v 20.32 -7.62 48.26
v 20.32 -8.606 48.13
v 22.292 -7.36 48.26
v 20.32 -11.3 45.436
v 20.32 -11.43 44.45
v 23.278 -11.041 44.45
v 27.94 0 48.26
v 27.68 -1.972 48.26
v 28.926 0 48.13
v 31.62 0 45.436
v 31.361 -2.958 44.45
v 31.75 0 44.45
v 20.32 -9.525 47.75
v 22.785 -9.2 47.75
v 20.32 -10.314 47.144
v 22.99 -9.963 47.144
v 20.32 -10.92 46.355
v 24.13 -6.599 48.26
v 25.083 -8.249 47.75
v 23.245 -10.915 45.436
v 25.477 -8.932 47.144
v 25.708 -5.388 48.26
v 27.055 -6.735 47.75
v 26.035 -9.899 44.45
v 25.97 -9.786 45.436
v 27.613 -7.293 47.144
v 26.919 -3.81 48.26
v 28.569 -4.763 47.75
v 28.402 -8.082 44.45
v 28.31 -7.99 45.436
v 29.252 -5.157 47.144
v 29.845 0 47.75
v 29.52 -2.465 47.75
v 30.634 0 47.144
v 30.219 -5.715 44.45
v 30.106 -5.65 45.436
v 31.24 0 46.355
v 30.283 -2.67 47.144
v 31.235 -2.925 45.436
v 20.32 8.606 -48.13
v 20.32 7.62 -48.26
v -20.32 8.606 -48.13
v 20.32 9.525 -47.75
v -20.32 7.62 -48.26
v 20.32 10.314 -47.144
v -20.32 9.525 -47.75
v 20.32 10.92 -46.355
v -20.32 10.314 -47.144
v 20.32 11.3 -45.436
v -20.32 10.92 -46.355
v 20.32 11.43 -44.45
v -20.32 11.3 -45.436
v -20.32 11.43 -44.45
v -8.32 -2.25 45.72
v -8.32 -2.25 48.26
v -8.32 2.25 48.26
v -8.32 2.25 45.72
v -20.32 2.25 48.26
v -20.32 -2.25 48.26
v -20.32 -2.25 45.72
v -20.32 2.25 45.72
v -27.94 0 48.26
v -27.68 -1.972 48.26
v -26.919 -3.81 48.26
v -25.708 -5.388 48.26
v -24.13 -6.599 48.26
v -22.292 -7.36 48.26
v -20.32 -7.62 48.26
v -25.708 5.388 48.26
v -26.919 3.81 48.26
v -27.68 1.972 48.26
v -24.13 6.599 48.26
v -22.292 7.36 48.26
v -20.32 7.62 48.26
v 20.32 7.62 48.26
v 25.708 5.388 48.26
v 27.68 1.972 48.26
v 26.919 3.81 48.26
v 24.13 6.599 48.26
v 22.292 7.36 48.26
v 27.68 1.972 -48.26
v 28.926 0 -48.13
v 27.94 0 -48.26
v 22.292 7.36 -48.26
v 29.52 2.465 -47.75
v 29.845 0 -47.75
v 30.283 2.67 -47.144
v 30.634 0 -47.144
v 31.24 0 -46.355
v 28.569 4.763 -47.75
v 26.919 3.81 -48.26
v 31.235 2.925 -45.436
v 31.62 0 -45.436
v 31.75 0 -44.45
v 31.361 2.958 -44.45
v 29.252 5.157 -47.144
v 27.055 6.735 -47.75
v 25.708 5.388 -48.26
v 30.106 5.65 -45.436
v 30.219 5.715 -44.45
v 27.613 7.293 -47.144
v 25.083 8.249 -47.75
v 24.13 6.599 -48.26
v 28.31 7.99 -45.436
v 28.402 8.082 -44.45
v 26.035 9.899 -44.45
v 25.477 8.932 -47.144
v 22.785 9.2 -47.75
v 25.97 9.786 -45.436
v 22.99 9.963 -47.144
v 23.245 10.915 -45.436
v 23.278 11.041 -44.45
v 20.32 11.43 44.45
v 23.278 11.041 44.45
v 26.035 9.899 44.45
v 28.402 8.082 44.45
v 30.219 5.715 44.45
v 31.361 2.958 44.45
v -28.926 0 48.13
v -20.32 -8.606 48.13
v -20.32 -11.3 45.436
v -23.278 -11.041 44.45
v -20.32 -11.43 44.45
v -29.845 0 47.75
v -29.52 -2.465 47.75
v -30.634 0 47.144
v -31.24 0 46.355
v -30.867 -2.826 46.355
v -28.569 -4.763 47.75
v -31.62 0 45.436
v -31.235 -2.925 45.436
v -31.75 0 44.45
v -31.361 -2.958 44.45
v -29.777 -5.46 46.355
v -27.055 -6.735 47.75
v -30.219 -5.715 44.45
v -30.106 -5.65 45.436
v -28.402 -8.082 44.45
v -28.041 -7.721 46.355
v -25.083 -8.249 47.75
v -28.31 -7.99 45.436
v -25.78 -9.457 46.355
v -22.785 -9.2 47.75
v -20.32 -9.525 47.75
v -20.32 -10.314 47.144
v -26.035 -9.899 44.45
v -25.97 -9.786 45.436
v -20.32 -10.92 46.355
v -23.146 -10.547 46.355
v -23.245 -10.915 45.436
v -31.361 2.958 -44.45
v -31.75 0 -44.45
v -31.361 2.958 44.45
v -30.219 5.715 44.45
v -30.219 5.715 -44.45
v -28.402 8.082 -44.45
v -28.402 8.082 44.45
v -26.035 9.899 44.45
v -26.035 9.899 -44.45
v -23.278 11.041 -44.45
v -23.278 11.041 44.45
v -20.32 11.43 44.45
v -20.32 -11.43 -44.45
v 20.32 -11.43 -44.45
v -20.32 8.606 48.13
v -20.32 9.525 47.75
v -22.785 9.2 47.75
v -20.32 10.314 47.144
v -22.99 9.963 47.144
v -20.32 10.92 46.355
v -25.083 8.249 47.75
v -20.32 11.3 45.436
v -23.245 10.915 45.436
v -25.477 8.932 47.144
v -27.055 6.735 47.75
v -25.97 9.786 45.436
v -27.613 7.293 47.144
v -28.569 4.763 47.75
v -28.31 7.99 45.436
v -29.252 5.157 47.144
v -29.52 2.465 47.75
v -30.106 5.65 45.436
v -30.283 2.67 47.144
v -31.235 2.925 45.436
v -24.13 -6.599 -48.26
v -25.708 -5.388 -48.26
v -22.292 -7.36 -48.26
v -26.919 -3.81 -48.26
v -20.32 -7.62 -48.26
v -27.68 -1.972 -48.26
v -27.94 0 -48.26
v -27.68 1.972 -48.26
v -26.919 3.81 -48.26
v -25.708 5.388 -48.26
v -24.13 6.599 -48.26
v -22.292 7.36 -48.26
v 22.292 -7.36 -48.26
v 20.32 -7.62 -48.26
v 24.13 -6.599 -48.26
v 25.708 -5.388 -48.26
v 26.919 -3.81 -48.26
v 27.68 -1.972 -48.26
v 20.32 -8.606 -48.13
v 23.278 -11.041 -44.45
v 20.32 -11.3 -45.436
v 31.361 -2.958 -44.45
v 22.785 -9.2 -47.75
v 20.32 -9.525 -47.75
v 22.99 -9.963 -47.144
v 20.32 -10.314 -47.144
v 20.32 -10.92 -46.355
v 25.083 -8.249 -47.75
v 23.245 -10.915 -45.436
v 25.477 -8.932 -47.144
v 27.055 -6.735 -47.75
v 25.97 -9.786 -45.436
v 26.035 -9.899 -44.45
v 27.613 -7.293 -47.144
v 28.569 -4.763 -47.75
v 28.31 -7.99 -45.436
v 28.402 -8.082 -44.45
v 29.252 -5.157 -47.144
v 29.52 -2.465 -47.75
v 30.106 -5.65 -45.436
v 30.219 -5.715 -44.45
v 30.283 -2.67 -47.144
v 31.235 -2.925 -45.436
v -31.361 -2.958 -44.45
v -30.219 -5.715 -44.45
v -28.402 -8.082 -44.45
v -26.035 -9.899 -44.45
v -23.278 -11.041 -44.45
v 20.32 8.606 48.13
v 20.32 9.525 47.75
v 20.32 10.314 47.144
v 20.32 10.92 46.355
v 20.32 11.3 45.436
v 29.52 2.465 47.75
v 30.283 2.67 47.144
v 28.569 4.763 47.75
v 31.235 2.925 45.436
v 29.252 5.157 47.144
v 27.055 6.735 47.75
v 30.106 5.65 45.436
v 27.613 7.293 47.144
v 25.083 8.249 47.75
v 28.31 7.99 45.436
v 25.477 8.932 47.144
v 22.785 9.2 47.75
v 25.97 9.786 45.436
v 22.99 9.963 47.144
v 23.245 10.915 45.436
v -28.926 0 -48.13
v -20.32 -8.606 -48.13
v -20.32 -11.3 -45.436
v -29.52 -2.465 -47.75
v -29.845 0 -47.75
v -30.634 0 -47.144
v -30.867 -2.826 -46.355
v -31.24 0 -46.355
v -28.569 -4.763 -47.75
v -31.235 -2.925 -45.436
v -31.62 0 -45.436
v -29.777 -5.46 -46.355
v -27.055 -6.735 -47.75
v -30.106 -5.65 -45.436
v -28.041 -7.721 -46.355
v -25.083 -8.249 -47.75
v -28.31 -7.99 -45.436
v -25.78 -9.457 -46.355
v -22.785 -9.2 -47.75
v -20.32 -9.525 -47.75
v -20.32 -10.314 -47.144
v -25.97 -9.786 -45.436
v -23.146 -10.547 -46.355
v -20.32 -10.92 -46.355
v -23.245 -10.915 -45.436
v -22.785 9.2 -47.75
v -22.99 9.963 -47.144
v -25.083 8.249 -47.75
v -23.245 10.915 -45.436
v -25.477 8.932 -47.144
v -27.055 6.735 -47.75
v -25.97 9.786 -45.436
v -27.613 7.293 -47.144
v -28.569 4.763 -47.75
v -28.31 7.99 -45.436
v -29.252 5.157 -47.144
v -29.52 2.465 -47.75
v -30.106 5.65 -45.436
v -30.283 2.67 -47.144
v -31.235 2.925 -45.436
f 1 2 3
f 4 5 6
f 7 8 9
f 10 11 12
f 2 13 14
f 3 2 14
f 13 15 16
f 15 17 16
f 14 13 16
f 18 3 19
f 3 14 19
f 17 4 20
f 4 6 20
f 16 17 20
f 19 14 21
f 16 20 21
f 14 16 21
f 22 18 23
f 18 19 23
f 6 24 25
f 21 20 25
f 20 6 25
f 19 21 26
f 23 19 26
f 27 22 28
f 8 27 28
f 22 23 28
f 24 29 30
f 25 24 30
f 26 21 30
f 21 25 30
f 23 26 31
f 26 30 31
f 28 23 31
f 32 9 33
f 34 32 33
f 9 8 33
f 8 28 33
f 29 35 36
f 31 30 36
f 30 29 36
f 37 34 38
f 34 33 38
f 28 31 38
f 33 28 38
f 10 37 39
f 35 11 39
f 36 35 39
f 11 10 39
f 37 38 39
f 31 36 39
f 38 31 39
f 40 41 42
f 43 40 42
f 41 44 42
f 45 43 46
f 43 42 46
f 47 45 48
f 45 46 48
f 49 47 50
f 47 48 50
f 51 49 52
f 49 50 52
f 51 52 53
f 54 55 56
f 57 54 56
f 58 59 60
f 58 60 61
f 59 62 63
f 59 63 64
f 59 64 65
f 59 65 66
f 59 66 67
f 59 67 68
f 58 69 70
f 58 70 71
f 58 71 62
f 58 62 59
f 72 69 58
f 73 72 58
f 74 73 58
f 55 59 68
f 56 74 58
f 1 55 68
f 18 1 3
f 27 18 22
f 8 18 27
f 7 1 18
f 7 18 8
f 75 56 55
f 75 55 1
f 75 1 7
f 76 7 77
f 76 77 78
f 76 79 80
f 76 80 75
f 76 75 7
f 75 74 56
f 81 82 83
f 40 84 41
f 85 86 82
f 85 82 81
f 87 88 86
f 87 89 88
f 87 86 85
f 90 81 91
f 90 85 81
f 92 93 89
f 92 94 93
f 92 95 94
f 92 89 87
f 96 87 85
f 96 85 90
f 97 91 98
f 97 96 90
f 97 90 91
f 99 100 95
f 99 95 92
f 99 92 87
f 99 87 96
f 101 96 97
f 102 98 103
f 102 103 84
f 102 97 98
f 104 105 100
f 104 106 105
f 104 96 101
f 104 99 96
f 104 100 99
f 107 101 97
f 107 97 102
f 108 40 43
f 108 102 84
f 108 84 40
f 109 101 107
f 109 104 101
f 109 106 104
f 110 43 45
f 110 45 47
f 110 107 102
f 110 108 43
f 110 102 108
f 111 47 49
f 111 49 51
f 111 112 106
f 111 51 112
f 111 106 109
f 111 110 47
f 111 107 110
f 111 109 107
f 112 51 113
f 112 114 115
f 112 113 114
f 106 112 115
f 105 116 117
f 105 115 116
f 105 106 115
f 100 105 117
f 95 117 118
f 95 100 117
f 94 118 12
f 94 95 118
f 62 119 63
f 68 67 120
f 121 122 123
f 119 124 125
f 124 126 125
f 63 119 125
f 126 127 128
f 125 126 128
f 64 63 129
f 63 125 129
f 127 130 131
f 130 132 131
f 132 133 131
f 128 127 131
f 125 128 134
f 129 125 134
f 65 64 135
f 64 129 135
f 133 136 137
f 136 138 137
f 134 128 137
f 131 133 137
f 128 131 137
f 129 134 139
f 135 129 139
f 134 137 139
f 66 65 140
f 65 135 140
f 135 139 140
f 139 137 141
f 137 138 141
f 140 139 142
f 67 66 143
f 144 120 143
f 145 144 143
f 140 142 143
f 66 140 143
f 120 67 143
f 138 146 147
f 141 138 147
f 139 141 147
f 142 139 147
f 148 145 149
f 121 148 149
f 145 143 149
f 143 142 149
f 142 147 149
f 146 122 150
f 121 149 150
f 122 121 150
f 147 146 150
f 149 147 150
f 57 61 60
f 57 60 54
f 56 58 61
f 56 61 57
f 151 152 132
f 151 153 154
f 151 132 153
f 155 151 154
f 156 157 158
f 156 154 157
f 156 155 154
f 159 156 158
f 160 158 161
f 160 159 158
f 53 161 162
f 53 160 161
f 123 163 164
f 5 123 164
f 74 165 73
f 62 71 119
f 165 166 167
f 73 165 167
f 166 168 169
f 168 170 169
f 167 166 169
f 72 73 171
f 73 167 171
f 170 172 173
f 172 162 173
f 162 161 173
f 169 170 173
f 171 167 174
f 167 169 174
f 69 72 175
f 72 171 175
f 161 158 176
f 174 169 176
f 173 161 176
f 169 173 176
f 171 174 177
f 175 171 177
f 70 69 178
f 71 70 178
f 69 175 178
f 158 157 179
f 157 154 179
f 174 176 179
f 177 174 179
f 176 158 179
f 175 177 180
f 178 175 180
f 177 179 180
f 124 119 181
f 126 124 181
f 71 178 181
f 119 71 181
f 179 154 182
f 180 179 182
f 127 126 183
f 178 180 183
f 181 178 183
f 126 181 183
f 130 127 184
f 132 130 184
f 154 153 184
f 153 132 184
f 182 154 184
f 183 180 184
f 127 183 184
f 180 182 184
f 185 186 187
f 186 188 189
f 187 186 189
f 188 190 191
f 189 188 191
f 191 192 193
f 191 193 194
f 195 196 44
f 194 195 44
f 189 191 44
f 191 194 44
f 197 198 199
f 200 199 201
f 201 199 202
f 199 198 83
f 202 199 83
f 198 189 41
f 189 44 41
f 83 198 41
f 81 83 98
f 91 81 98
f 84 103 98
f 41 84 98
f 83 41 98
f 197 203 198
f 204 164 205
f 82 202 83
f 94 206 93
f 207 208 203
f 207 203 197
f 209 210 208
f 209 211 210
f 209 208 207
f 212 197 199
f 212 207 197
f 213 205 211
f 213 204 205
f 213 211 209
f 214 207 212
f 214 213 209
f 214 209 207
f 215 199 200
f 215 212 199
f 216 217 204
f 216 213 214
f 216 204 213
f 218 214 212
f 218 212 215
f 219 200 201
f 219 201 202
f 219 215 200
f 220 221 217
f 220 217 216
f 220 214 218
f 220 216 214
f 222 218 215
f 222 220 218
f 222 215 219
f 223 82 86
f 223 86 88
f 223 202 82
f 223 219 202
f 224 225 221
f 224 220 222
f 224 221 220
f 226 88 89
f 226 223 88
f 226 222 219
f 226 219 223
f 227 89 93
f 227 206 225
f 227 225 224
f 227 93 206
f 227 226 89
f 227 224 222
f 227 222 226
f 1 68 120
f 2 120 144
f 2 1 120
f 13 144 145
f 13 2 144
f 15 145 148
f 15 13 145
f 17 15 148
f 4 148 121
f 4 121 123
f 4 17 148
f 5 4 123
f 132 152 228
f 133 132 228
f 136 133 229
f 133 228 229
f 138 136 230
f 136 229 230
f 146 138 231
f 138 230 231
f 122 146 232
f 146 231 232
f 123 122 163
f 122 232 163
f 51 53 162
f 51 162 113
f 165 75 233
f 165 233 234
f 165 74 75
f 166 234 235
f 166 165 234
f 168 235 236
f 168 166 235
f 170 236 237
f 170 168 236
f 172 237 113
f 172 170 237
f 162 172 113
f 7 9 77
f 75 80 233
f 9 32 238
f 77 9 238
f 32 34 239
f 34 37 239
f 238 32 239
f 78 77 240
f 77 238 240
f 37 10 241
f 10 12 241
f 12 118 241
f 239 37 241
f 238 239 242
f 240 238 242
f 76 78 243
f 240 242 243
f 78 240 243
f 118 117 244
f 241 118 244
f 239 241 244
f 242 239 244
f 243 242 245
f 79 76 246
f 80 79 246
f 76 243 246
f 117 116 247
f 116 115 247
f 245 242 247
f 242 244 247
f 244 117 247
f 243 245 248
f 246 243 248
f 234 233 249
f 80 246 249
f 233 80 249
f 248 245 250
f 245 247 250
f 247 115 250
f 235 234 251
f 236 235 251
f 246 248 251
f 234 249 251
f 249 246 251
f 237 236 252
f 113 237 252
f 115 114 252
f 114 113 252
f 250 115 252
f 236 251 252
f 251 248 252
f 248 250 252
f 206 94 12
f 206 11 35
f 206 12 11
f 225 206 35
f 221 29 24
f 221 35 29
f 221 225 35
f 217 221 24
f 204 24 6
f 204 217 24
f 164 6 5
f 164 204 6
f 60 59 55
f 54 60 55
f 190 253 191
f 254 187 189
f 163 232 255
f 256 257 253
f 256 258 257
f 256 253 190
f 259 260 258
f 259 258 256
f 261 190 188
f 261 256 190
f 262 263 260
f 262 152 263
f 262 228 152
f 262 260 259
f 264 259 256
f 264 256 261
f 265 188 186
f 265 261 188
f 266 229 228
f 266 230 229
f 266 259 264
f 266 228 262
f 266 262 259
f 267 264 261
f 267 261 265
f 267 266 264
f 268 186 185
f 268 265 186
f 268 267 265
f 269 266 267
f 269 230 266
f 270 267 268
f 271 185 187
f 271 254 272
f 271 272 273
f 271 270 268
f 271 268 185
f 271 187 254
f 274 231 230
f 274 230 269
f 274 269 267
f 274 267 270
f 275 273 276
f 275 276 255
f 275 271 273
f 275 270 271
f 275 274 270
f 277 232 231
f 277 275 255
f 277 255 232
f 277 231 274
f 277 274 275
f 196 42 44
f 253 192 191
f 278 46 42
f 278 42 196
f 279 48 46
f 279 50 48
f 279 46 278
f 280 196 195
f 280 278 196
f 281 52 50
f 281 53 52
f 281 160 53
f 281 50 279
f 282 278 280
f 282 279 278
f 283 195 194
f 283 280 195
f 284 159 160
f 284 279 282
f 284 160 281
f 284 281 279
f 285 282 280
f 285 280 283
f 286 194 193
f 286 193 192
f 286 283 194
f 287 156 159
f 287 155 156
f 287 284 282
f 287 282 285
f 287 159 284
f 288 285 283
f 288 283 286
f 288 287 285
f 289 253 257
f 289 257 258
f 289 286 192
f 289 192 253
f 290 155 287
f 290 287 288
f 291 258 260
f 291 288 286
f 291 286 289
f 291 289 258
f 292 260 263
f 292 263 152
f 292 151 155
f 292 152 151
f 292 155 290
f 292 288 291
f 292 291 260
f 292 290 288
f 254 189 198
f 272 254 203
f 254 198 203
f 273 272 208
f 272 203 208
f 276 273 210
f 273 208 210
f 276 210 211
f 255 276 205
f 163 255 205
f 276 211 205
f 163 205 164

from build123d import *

# Parameters (mm, degrees)
SKETCH1_W           = 63.5
SKETCH1_H           = 96.52
BOSS_EXTRUDE1_DEPTH = 11.43
FILLET1_R           = 11.43
FILLET2_R           = 3.81
SKETCH2_W           = 12
SKETCH2_H           = 4.49999989
CUT_EXTRUDE1_DEPTH  = 2.54


with BuildPart() as part:
    # Sketch1 → Boss-Extrude1 (new, symmetric)
    with BuildSketch(Plane(origin=(0, 0, 0), x_dir=(1, 0, 0), z_dir=(0, 1, 0))):
        Rectangle(SKETCH1_W, SKETCH1_H)
    extrude(amount=BOSS_EXTRUDE1_DEPTH, both=True)

    # Fillet1
    fillet1_edges = [part.edges().sort_by_distance(p)[0] for p in [
        (-31.75, -11.43, 0),
        (-31.75, 11.43, 0),
        (31.75, -11.43, 0),
        (31.75, 11.43, 0),
    ]]
    fillet(fillet1_edges, radius=FILLET1_R - 0.0001)  # a hair under: the kernel refuses the full size

    # Fillet2
    fillet2_edges = [part.edges().sort_by_distance(p)[0] for p in [
        (0, -11.43, 48.26),
        (0, 11.43, 48.26),
        (28.402259798, 8.082259798, 48.26),
        (28.402259798, -8.082259798, 48.26),
        (-28.402259798, 8.082259798, 48.26),
        (-28.402259798, -8.082259798, 48.26),
        (0, -11.43, -48.26),
        (0, 11.43, -48.26),
        (28.402259798, 8.082259798, -48.26),
        (28.402259798, -8.082259798, -48.26),
        (-28.402259798, 8.082259798, -48.26),
        (-28.402259798, -8.082259798, -48.26),
    ]]
    fillet(fillet2_edges, radius=FILLET2_R)

    # Sketch2 → Cut-Extrude1 (cut)
    with BuildSketch(Plane.XY.offset(48.26)):
        with Locations((-14.32, 0)):
            Rectangle(SKETCH2_W, SKETCH2_H)
    extrude(amount=-CUT_EXTRUDE1_DEPTH, mode=Mode.SUBTRACT)


solid = part.part
